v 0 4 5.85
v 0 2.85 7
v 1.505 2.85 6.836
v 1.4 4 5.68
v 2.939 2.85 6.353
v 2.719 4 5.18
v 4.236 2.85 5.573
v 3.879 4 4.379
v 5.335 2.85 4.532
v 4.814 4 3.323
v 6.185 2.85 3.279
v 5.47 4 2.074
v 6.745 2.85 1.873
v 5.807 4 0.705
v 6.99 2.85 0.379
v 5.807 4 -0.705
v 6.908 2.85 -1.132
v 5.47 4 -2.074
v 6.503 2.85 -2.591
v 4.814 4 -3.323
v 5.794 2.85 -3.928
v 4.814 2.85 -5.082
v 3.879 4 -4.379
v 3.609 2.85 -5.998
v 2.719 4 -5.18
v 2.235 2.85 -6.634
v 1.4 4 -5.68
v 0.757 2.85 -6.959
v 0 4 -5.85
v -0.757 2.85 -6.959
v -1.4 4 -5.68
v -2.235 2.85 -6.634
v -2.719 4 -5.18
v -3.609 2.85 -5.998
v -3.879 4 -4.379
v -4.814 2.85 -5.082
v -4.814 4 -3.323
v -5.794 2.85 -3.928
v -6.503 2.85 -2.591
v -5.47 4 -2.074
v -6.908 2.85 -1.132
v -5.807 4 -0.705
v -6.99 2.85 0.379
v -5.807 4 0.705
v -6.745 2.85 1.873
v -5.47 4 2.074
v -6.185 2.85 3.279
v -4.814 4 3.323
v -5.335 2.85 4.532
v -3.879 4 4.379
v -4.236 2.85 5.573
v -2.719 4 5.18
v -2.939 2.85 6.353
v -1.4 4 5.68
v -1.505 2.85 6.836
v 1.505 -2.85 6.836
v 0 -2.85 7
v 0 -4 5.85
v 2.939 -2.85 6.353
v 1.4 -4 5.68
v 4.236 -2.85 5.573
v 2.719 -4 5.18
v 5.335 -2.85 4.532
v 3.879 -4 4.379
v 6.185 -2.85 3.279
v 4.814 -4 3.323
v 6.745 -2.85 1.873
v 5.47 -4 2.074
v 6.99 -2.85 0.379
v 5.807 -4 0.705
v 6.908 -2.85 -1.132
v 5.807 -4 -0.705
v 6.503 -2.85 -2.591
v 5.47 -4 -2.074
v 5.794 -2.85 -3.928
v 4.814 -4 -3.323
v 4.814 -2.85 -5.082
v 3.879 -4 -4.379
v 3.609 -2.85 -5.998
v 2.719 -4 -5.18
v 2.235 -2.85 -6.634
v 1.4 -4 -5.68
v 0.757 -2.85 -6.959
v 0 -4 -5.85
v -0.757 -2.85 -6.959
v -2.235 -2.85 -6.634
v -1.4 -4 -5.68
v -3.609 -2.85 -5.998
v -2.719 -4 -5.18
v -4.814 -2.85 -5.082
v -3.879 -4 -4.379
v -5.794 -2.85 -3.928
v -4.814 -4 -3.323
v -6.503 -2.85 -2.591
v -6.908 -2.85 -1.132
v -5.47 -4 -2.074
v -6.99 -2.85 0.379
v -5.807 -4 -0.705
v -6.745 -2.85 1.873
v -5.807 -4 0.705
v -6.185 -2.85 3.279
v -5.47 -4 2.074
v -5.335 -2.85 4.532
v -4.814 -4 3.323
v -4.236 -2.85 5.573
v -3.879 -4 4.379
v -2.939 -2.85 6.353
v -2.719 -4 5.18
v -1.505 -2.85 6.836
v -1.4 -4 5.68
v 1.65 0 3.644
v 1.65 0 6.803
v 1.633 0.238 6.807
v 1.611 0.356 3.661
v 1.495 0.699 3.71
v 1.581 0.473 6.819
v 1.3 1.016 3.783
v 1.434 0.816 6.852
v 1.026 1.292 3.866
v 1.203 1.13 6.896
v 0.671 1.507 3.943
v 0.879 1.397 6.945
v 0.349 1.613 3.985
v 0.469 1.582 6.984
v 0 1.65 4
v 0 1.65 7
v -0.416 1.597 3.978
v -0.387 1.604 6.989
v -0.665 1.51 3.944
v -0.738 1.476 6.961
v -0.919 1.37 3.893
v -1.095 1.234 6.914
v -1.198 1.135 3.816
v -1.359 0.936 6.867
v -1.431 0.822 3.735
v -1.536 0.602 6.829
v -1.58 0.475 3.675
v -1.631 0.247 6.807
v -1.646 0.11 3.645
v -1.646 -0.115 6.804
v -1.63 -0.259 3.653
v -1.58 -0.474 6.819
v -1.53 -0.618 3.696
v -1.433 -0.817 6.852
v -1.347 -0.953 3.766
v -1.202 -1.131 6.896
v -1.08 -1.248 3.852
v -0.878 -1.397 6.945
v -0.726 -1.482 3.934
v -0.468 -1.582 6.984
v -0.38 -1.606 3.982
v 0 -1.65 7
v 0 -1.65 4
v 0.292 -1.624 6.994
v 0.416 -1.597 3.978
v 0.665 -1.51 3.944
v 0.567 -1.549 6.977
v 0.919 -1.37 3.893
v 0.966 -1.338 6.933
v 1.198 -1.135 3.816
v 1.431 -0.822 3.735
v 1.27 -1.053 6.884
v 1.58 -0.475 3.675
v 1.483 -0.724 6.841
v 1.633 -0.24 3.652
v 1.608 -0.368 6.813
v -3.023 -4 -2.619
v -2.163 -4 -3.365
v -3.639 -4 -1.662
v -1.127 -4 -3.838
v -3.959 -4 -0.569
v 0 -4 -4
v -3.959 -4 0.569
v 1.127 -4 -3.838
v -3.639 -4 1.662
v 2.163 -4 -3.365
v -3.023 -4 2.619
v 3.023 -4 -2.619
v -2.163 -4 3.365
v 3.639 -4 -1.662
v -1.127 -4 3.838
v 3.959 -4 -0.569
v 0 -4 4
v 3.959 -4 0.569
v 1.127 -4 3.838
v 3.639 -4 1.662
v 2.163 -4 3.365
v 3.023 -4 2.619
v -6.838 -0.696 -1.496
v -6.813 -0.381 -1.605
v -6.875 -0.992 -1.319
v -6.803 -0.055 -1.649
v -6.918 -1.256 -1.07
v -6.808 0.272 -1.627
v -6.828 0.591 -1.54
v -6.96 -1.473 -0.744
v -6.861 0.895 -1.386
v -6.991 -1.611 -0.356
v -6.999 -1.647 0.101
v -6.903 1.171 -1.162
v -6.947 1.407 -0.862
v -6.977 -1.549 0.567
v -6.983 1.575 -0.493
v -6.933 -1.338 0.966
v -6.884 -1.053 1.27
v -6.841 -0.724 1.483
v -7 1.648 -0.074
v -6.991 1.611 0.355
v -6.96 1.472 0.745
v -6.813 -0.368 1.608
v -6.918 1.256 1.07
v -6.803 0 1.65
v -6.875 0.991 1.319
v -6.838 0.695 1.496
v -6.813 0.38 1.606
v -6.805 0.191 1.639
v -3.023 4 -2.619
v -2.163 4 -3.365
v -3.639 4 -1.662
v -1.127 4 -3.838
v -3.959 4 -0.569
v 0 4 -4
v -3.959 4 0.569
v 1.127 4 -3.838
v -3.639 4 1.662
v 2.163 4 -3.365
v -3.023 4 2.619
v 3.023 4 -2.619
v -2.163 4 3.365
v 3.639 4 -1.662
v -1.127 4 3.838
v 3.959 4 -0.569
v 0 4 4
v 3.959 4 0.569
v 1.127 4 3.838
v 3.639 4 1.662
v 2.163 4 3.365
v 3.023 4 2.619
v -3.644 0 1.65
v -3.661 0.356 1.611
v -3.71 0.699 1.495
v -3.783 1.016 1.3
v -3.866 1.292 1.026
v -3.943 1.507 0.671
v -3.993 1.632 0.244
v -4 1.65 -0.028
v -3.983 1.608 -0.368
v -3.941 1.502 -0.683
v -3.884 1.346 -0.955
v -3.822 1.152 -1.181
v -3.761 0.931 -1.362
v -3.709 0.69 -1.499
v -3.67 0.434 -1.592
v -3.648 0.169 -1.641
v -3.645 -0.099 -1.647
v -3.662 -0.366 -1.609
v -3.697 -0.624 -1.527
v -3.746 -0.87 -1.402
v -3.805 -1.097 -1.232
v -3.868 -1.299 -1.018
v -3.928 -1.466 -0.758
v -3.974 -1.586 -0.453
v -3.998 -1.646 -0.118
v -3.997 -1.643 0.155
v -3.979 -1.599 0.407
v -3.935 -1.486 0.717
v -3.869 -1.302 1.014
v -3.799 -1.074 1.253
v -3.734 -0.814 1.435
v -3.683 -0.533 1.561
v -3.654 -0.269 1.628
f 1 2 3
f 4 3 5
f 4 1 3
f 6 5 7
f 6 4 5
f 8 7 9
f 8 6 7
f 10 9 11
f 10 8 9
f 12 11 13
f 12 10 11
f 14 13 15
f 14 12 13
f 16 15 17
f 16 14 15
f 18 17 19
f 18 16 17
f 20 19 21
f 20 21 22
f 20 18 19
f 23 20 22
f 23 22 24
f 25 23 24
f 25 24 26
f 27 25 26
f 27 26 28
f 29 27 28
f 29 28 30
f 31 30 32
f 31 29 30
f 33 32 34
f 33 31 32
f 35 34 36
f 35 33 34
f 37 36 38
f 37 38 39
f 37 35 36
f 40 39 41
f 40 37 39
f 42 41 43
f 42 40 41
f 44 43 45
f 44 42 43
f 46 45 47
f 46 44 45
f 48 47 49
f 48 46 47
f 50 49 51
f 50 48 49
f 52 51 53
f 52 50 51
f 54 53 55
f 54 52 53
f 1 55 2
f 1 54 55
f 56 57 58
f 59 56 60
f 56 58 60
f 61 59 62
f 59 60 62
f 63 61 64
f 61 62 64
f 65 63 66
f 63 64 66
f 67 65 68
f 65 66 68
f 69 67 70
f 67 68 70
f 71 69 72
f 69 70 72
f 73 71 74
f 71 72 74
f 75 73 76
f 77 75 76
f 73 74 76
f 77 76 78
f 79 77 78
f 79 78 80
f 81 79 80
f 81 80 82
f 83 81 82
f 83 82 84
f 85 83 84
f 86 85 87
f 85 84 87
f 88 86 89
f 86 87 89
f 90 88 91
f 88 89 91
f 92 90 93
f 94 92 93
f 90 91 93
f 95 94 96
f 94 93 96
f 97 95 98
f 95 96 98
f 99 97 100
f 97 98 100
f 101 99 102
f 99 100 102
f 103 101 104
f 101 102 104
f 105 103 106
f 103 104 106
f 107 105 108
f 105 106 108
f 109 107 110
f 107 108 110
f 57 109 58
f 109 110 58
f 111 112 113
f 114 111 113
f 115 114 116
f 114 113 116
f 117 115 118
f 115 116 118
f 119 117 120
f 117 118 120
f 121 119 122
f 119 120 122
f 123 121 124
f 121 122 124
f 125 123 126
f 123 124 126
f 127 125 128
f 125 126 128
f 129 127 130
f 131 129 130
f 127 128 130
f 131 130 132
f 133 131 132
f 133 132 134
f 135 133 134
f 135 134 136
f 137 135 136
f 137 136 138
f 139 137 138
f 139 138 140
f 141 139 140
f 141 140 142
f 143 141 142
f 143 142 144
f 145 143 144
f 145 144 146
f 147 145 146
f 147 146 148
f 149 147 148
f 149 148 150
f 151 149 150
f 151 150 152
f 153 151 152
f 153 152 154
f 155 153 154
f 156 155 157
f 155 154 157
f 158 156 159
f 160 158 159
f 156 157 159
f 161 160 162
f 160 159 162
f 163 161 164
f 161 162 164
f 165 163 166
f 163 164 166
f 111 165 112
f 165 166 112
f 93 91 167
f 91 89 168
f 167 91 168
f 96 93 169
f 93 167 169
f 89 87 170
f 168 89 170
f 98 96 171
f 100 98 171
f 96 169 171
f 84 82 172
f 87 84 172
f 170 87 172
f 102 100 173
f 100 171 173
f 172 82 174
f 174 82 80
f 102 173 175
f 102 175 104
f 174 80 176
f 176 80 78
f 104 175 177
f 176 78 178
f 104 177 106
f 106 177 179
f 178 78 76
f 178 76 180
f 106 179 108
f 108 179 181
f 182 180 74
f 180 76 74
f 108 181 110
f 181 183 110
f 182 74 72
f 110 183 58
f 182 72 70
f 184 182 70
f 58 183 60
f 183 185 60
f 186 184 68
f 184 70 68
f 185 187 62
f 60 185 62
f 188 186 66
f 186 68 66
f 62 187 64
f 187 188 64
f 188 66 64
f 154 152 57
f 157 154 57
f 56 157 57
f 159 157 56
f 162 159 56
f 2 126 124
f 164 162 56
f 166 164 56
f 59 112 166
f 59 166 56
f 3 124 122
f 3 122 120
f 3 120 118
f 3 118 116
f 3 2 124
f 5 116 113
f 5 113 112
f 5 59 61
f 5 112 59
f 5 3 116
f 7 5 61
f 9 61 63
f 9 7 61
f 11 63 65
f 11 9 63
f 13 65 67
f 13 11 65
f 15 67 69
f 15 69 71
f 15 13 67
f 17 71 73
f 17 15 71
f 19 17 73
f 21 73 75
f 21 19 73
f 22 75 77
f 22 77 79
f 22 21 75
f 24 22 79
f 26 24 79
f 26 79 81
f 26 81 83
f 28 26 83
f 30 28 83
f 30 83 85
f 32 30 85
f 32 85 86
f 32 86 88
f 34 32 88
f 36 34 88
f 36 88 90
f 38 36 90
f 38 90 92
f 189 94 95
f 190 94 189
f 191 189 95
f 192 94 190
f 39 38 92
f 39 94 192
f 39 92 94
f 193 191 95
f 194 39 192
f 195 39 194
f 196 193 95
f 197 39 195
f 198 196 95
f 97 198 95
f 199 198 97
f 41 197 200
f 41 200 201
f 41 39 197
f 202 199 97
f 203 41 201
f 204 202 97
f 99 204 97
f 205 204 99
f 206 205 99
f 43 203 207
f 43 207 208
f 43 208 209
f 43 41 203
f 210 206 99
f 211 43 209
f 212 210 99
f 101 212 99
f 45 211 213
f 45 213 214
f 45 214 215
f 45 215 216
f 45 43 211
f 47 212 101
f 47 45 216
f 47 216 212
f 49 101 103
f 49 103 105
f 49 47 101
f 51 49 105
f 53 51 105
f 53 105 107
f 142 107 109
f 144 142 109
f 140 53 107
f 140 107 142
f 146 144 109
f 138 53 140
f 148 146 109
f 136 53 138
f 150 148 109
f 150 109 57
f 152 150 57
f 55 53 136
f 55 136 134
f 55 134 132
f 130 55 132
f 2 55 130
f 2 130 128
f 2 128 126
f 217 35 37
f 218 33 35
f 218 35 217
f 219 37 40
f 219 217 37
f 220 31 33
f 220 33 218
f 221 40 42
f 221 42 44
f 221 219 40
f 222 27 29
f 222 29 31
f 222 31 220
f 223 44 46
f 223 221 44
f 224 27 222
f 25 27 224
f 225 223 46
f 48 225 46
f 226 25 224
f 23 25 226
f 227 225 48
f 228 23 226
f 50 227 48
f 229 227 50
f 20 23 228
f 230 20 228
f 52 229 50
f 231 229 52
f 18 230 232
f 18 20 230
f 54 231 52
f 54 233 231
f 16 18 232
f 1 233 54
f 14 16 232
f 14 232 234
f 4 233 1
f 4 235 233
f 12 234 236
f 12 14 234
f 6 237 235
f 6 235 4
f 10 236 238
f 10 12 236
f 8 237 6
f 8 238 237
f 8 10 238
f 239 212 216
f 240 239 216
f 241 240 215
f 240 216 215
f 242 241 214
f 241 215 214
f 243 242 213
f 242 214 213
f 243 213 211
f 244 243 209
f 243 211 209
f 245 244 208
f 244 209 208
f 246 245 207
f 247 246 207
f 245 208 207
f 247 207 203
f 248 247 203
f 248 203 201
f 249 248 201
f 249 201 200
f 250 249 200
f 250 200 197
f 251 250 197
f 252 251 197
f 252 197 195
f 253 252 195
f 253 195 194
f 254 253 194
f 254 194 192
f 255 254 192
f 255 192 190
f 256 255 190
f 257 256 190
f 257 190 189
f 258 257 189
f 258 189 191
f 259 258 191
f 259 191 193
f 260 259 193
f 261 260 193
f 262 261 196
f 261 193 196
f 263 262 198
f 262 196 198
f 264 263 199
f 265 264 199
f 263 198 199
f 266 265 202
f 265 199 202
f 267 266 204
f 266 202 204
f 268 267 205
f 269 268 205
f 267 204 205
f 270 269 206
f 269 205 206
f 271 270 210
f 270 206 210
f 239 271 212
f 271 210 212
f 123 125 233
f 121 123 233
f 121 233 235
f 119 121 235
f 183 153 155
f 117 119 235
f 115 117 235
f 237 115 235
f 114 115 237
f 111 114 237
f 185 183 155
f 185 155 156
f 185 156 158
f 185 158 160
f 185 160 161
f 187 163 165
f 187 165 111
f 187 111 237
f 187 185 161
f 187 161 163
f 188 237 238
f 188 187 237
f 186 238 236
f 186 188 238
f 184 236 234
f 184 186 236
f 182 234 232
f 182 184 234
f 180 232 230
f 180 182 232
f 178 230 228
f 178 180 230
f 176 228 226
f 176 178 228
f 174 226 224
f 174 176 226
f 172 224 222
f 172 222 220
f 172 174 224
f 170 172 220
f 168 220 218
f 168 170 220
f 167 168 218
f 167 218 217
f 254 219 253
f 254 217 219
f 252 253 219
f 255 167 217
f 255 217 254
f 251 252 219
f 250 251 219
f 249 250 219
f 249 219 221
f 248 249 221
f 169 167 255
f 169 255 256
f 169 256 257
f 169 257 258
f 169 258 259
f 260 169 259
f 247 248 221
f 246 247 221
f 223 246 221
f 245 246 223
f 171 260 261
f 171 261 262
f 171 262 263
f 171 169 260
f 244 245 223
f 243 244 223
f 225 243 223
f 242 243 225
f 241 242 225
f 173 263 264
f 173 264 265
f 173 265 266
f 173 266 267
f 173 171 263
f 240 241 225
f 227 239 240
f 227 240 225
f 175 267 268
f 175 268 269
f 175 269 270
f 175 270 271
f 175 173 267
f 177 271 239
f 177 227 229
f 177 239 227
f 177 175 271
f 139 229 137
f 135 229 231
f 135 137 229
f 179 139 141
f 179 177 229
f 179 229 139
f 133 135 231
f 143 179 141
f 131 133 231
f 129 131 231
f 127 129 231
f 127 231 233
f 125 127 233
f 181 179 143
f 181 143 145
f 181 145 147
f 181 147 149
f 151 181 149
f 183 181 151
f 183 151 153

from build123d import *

# Parameters (mm, degrees)
SKETCH1_R                  = 7
SKETCH1_R_2                = 4
BOSS_EXTRUDE1_DEPTH        = 4
M4X0_7_TAPPED_HOLE1_REACH  = 18.155
M4X0_7_TAPPED_HOLE1_BORE_R = 1.65
CHAMFER1_SIZE              = 1.15
CIRPATTERN1_COUNT          = 2
CIRPATTERN1_ANGLE          = 90


with BuildPart() as part:
    # Sketch1 → Boss-Extrude1 (new, symmetric)
    with BuildSketch(Plane(origin=(0, 0, 0), x_dir=(1, 0, 0), z_dir=(0, 1, 0))):
        with Locations(Location((0, 0, 0), (0, 0, 270))):
            Circle(SKETCH1_R)
        with Locations(Location((0, 0, 0), (0, 0, 270))):
            Circle(SKETCH1_R_2, mode=Mode.SUBTRACT)
    extrude(amount=BOSS_EXTRUDE1_DEPTH, both=True)

    # M4x0.7 Tapped Hole1 bore → M4x0.7 Tapped Hole1 (cut, up to next)
    with BuildSketch(Plane.XY.offset(7), mode=Mode.PRIVATE) as m4x0_7_tapped_hole1_sk1:
        Circle(M4X0_7_TAPPED_HOLE1_BORE_R)
    m4x0_7_tapped_hole1_tool1 = extrude(m4x0_7_tapped_hole1_sk1.sketch, amount=-M4X0_7_TAPPED_HOLE1_REACH, mode=Mode.PRIVATE) & part.part
    m4x0_7_tapped_hole1 = m4x0_7_tapped_hole1_tool1.solids().sort_by_distance((0, 0, 7))[0]
    add(m4x0_7_tapped_hole1, mode=Mode.SUBTRACT)

    # Chamfer1
    chamfer1_edges = [part.edges().sort_by_distance(p)[0] for p in [
        (0, -4, -7),
        (0, 4, -7),
    ]]
    chamfer(chamfer1_edges, length=CHAMFER1_SIZE)

    # CirPattern1: M4x0.7 Tapped Hole1 ×2 about axis
    cirpattern1_axis = Axis((0, 4, 0), (0, -1, 0))
    for i in range(1, CIRPATTERN1_COUNT):
        add(m4x0_7_tapped_hole1.rotate(cirpattern1_axis, i * CIRPATTERN1_ANGLE / (CIRPATTERN1_COUNT - 1)), mode=Mode.SUBTRACT)


solid = part.part
